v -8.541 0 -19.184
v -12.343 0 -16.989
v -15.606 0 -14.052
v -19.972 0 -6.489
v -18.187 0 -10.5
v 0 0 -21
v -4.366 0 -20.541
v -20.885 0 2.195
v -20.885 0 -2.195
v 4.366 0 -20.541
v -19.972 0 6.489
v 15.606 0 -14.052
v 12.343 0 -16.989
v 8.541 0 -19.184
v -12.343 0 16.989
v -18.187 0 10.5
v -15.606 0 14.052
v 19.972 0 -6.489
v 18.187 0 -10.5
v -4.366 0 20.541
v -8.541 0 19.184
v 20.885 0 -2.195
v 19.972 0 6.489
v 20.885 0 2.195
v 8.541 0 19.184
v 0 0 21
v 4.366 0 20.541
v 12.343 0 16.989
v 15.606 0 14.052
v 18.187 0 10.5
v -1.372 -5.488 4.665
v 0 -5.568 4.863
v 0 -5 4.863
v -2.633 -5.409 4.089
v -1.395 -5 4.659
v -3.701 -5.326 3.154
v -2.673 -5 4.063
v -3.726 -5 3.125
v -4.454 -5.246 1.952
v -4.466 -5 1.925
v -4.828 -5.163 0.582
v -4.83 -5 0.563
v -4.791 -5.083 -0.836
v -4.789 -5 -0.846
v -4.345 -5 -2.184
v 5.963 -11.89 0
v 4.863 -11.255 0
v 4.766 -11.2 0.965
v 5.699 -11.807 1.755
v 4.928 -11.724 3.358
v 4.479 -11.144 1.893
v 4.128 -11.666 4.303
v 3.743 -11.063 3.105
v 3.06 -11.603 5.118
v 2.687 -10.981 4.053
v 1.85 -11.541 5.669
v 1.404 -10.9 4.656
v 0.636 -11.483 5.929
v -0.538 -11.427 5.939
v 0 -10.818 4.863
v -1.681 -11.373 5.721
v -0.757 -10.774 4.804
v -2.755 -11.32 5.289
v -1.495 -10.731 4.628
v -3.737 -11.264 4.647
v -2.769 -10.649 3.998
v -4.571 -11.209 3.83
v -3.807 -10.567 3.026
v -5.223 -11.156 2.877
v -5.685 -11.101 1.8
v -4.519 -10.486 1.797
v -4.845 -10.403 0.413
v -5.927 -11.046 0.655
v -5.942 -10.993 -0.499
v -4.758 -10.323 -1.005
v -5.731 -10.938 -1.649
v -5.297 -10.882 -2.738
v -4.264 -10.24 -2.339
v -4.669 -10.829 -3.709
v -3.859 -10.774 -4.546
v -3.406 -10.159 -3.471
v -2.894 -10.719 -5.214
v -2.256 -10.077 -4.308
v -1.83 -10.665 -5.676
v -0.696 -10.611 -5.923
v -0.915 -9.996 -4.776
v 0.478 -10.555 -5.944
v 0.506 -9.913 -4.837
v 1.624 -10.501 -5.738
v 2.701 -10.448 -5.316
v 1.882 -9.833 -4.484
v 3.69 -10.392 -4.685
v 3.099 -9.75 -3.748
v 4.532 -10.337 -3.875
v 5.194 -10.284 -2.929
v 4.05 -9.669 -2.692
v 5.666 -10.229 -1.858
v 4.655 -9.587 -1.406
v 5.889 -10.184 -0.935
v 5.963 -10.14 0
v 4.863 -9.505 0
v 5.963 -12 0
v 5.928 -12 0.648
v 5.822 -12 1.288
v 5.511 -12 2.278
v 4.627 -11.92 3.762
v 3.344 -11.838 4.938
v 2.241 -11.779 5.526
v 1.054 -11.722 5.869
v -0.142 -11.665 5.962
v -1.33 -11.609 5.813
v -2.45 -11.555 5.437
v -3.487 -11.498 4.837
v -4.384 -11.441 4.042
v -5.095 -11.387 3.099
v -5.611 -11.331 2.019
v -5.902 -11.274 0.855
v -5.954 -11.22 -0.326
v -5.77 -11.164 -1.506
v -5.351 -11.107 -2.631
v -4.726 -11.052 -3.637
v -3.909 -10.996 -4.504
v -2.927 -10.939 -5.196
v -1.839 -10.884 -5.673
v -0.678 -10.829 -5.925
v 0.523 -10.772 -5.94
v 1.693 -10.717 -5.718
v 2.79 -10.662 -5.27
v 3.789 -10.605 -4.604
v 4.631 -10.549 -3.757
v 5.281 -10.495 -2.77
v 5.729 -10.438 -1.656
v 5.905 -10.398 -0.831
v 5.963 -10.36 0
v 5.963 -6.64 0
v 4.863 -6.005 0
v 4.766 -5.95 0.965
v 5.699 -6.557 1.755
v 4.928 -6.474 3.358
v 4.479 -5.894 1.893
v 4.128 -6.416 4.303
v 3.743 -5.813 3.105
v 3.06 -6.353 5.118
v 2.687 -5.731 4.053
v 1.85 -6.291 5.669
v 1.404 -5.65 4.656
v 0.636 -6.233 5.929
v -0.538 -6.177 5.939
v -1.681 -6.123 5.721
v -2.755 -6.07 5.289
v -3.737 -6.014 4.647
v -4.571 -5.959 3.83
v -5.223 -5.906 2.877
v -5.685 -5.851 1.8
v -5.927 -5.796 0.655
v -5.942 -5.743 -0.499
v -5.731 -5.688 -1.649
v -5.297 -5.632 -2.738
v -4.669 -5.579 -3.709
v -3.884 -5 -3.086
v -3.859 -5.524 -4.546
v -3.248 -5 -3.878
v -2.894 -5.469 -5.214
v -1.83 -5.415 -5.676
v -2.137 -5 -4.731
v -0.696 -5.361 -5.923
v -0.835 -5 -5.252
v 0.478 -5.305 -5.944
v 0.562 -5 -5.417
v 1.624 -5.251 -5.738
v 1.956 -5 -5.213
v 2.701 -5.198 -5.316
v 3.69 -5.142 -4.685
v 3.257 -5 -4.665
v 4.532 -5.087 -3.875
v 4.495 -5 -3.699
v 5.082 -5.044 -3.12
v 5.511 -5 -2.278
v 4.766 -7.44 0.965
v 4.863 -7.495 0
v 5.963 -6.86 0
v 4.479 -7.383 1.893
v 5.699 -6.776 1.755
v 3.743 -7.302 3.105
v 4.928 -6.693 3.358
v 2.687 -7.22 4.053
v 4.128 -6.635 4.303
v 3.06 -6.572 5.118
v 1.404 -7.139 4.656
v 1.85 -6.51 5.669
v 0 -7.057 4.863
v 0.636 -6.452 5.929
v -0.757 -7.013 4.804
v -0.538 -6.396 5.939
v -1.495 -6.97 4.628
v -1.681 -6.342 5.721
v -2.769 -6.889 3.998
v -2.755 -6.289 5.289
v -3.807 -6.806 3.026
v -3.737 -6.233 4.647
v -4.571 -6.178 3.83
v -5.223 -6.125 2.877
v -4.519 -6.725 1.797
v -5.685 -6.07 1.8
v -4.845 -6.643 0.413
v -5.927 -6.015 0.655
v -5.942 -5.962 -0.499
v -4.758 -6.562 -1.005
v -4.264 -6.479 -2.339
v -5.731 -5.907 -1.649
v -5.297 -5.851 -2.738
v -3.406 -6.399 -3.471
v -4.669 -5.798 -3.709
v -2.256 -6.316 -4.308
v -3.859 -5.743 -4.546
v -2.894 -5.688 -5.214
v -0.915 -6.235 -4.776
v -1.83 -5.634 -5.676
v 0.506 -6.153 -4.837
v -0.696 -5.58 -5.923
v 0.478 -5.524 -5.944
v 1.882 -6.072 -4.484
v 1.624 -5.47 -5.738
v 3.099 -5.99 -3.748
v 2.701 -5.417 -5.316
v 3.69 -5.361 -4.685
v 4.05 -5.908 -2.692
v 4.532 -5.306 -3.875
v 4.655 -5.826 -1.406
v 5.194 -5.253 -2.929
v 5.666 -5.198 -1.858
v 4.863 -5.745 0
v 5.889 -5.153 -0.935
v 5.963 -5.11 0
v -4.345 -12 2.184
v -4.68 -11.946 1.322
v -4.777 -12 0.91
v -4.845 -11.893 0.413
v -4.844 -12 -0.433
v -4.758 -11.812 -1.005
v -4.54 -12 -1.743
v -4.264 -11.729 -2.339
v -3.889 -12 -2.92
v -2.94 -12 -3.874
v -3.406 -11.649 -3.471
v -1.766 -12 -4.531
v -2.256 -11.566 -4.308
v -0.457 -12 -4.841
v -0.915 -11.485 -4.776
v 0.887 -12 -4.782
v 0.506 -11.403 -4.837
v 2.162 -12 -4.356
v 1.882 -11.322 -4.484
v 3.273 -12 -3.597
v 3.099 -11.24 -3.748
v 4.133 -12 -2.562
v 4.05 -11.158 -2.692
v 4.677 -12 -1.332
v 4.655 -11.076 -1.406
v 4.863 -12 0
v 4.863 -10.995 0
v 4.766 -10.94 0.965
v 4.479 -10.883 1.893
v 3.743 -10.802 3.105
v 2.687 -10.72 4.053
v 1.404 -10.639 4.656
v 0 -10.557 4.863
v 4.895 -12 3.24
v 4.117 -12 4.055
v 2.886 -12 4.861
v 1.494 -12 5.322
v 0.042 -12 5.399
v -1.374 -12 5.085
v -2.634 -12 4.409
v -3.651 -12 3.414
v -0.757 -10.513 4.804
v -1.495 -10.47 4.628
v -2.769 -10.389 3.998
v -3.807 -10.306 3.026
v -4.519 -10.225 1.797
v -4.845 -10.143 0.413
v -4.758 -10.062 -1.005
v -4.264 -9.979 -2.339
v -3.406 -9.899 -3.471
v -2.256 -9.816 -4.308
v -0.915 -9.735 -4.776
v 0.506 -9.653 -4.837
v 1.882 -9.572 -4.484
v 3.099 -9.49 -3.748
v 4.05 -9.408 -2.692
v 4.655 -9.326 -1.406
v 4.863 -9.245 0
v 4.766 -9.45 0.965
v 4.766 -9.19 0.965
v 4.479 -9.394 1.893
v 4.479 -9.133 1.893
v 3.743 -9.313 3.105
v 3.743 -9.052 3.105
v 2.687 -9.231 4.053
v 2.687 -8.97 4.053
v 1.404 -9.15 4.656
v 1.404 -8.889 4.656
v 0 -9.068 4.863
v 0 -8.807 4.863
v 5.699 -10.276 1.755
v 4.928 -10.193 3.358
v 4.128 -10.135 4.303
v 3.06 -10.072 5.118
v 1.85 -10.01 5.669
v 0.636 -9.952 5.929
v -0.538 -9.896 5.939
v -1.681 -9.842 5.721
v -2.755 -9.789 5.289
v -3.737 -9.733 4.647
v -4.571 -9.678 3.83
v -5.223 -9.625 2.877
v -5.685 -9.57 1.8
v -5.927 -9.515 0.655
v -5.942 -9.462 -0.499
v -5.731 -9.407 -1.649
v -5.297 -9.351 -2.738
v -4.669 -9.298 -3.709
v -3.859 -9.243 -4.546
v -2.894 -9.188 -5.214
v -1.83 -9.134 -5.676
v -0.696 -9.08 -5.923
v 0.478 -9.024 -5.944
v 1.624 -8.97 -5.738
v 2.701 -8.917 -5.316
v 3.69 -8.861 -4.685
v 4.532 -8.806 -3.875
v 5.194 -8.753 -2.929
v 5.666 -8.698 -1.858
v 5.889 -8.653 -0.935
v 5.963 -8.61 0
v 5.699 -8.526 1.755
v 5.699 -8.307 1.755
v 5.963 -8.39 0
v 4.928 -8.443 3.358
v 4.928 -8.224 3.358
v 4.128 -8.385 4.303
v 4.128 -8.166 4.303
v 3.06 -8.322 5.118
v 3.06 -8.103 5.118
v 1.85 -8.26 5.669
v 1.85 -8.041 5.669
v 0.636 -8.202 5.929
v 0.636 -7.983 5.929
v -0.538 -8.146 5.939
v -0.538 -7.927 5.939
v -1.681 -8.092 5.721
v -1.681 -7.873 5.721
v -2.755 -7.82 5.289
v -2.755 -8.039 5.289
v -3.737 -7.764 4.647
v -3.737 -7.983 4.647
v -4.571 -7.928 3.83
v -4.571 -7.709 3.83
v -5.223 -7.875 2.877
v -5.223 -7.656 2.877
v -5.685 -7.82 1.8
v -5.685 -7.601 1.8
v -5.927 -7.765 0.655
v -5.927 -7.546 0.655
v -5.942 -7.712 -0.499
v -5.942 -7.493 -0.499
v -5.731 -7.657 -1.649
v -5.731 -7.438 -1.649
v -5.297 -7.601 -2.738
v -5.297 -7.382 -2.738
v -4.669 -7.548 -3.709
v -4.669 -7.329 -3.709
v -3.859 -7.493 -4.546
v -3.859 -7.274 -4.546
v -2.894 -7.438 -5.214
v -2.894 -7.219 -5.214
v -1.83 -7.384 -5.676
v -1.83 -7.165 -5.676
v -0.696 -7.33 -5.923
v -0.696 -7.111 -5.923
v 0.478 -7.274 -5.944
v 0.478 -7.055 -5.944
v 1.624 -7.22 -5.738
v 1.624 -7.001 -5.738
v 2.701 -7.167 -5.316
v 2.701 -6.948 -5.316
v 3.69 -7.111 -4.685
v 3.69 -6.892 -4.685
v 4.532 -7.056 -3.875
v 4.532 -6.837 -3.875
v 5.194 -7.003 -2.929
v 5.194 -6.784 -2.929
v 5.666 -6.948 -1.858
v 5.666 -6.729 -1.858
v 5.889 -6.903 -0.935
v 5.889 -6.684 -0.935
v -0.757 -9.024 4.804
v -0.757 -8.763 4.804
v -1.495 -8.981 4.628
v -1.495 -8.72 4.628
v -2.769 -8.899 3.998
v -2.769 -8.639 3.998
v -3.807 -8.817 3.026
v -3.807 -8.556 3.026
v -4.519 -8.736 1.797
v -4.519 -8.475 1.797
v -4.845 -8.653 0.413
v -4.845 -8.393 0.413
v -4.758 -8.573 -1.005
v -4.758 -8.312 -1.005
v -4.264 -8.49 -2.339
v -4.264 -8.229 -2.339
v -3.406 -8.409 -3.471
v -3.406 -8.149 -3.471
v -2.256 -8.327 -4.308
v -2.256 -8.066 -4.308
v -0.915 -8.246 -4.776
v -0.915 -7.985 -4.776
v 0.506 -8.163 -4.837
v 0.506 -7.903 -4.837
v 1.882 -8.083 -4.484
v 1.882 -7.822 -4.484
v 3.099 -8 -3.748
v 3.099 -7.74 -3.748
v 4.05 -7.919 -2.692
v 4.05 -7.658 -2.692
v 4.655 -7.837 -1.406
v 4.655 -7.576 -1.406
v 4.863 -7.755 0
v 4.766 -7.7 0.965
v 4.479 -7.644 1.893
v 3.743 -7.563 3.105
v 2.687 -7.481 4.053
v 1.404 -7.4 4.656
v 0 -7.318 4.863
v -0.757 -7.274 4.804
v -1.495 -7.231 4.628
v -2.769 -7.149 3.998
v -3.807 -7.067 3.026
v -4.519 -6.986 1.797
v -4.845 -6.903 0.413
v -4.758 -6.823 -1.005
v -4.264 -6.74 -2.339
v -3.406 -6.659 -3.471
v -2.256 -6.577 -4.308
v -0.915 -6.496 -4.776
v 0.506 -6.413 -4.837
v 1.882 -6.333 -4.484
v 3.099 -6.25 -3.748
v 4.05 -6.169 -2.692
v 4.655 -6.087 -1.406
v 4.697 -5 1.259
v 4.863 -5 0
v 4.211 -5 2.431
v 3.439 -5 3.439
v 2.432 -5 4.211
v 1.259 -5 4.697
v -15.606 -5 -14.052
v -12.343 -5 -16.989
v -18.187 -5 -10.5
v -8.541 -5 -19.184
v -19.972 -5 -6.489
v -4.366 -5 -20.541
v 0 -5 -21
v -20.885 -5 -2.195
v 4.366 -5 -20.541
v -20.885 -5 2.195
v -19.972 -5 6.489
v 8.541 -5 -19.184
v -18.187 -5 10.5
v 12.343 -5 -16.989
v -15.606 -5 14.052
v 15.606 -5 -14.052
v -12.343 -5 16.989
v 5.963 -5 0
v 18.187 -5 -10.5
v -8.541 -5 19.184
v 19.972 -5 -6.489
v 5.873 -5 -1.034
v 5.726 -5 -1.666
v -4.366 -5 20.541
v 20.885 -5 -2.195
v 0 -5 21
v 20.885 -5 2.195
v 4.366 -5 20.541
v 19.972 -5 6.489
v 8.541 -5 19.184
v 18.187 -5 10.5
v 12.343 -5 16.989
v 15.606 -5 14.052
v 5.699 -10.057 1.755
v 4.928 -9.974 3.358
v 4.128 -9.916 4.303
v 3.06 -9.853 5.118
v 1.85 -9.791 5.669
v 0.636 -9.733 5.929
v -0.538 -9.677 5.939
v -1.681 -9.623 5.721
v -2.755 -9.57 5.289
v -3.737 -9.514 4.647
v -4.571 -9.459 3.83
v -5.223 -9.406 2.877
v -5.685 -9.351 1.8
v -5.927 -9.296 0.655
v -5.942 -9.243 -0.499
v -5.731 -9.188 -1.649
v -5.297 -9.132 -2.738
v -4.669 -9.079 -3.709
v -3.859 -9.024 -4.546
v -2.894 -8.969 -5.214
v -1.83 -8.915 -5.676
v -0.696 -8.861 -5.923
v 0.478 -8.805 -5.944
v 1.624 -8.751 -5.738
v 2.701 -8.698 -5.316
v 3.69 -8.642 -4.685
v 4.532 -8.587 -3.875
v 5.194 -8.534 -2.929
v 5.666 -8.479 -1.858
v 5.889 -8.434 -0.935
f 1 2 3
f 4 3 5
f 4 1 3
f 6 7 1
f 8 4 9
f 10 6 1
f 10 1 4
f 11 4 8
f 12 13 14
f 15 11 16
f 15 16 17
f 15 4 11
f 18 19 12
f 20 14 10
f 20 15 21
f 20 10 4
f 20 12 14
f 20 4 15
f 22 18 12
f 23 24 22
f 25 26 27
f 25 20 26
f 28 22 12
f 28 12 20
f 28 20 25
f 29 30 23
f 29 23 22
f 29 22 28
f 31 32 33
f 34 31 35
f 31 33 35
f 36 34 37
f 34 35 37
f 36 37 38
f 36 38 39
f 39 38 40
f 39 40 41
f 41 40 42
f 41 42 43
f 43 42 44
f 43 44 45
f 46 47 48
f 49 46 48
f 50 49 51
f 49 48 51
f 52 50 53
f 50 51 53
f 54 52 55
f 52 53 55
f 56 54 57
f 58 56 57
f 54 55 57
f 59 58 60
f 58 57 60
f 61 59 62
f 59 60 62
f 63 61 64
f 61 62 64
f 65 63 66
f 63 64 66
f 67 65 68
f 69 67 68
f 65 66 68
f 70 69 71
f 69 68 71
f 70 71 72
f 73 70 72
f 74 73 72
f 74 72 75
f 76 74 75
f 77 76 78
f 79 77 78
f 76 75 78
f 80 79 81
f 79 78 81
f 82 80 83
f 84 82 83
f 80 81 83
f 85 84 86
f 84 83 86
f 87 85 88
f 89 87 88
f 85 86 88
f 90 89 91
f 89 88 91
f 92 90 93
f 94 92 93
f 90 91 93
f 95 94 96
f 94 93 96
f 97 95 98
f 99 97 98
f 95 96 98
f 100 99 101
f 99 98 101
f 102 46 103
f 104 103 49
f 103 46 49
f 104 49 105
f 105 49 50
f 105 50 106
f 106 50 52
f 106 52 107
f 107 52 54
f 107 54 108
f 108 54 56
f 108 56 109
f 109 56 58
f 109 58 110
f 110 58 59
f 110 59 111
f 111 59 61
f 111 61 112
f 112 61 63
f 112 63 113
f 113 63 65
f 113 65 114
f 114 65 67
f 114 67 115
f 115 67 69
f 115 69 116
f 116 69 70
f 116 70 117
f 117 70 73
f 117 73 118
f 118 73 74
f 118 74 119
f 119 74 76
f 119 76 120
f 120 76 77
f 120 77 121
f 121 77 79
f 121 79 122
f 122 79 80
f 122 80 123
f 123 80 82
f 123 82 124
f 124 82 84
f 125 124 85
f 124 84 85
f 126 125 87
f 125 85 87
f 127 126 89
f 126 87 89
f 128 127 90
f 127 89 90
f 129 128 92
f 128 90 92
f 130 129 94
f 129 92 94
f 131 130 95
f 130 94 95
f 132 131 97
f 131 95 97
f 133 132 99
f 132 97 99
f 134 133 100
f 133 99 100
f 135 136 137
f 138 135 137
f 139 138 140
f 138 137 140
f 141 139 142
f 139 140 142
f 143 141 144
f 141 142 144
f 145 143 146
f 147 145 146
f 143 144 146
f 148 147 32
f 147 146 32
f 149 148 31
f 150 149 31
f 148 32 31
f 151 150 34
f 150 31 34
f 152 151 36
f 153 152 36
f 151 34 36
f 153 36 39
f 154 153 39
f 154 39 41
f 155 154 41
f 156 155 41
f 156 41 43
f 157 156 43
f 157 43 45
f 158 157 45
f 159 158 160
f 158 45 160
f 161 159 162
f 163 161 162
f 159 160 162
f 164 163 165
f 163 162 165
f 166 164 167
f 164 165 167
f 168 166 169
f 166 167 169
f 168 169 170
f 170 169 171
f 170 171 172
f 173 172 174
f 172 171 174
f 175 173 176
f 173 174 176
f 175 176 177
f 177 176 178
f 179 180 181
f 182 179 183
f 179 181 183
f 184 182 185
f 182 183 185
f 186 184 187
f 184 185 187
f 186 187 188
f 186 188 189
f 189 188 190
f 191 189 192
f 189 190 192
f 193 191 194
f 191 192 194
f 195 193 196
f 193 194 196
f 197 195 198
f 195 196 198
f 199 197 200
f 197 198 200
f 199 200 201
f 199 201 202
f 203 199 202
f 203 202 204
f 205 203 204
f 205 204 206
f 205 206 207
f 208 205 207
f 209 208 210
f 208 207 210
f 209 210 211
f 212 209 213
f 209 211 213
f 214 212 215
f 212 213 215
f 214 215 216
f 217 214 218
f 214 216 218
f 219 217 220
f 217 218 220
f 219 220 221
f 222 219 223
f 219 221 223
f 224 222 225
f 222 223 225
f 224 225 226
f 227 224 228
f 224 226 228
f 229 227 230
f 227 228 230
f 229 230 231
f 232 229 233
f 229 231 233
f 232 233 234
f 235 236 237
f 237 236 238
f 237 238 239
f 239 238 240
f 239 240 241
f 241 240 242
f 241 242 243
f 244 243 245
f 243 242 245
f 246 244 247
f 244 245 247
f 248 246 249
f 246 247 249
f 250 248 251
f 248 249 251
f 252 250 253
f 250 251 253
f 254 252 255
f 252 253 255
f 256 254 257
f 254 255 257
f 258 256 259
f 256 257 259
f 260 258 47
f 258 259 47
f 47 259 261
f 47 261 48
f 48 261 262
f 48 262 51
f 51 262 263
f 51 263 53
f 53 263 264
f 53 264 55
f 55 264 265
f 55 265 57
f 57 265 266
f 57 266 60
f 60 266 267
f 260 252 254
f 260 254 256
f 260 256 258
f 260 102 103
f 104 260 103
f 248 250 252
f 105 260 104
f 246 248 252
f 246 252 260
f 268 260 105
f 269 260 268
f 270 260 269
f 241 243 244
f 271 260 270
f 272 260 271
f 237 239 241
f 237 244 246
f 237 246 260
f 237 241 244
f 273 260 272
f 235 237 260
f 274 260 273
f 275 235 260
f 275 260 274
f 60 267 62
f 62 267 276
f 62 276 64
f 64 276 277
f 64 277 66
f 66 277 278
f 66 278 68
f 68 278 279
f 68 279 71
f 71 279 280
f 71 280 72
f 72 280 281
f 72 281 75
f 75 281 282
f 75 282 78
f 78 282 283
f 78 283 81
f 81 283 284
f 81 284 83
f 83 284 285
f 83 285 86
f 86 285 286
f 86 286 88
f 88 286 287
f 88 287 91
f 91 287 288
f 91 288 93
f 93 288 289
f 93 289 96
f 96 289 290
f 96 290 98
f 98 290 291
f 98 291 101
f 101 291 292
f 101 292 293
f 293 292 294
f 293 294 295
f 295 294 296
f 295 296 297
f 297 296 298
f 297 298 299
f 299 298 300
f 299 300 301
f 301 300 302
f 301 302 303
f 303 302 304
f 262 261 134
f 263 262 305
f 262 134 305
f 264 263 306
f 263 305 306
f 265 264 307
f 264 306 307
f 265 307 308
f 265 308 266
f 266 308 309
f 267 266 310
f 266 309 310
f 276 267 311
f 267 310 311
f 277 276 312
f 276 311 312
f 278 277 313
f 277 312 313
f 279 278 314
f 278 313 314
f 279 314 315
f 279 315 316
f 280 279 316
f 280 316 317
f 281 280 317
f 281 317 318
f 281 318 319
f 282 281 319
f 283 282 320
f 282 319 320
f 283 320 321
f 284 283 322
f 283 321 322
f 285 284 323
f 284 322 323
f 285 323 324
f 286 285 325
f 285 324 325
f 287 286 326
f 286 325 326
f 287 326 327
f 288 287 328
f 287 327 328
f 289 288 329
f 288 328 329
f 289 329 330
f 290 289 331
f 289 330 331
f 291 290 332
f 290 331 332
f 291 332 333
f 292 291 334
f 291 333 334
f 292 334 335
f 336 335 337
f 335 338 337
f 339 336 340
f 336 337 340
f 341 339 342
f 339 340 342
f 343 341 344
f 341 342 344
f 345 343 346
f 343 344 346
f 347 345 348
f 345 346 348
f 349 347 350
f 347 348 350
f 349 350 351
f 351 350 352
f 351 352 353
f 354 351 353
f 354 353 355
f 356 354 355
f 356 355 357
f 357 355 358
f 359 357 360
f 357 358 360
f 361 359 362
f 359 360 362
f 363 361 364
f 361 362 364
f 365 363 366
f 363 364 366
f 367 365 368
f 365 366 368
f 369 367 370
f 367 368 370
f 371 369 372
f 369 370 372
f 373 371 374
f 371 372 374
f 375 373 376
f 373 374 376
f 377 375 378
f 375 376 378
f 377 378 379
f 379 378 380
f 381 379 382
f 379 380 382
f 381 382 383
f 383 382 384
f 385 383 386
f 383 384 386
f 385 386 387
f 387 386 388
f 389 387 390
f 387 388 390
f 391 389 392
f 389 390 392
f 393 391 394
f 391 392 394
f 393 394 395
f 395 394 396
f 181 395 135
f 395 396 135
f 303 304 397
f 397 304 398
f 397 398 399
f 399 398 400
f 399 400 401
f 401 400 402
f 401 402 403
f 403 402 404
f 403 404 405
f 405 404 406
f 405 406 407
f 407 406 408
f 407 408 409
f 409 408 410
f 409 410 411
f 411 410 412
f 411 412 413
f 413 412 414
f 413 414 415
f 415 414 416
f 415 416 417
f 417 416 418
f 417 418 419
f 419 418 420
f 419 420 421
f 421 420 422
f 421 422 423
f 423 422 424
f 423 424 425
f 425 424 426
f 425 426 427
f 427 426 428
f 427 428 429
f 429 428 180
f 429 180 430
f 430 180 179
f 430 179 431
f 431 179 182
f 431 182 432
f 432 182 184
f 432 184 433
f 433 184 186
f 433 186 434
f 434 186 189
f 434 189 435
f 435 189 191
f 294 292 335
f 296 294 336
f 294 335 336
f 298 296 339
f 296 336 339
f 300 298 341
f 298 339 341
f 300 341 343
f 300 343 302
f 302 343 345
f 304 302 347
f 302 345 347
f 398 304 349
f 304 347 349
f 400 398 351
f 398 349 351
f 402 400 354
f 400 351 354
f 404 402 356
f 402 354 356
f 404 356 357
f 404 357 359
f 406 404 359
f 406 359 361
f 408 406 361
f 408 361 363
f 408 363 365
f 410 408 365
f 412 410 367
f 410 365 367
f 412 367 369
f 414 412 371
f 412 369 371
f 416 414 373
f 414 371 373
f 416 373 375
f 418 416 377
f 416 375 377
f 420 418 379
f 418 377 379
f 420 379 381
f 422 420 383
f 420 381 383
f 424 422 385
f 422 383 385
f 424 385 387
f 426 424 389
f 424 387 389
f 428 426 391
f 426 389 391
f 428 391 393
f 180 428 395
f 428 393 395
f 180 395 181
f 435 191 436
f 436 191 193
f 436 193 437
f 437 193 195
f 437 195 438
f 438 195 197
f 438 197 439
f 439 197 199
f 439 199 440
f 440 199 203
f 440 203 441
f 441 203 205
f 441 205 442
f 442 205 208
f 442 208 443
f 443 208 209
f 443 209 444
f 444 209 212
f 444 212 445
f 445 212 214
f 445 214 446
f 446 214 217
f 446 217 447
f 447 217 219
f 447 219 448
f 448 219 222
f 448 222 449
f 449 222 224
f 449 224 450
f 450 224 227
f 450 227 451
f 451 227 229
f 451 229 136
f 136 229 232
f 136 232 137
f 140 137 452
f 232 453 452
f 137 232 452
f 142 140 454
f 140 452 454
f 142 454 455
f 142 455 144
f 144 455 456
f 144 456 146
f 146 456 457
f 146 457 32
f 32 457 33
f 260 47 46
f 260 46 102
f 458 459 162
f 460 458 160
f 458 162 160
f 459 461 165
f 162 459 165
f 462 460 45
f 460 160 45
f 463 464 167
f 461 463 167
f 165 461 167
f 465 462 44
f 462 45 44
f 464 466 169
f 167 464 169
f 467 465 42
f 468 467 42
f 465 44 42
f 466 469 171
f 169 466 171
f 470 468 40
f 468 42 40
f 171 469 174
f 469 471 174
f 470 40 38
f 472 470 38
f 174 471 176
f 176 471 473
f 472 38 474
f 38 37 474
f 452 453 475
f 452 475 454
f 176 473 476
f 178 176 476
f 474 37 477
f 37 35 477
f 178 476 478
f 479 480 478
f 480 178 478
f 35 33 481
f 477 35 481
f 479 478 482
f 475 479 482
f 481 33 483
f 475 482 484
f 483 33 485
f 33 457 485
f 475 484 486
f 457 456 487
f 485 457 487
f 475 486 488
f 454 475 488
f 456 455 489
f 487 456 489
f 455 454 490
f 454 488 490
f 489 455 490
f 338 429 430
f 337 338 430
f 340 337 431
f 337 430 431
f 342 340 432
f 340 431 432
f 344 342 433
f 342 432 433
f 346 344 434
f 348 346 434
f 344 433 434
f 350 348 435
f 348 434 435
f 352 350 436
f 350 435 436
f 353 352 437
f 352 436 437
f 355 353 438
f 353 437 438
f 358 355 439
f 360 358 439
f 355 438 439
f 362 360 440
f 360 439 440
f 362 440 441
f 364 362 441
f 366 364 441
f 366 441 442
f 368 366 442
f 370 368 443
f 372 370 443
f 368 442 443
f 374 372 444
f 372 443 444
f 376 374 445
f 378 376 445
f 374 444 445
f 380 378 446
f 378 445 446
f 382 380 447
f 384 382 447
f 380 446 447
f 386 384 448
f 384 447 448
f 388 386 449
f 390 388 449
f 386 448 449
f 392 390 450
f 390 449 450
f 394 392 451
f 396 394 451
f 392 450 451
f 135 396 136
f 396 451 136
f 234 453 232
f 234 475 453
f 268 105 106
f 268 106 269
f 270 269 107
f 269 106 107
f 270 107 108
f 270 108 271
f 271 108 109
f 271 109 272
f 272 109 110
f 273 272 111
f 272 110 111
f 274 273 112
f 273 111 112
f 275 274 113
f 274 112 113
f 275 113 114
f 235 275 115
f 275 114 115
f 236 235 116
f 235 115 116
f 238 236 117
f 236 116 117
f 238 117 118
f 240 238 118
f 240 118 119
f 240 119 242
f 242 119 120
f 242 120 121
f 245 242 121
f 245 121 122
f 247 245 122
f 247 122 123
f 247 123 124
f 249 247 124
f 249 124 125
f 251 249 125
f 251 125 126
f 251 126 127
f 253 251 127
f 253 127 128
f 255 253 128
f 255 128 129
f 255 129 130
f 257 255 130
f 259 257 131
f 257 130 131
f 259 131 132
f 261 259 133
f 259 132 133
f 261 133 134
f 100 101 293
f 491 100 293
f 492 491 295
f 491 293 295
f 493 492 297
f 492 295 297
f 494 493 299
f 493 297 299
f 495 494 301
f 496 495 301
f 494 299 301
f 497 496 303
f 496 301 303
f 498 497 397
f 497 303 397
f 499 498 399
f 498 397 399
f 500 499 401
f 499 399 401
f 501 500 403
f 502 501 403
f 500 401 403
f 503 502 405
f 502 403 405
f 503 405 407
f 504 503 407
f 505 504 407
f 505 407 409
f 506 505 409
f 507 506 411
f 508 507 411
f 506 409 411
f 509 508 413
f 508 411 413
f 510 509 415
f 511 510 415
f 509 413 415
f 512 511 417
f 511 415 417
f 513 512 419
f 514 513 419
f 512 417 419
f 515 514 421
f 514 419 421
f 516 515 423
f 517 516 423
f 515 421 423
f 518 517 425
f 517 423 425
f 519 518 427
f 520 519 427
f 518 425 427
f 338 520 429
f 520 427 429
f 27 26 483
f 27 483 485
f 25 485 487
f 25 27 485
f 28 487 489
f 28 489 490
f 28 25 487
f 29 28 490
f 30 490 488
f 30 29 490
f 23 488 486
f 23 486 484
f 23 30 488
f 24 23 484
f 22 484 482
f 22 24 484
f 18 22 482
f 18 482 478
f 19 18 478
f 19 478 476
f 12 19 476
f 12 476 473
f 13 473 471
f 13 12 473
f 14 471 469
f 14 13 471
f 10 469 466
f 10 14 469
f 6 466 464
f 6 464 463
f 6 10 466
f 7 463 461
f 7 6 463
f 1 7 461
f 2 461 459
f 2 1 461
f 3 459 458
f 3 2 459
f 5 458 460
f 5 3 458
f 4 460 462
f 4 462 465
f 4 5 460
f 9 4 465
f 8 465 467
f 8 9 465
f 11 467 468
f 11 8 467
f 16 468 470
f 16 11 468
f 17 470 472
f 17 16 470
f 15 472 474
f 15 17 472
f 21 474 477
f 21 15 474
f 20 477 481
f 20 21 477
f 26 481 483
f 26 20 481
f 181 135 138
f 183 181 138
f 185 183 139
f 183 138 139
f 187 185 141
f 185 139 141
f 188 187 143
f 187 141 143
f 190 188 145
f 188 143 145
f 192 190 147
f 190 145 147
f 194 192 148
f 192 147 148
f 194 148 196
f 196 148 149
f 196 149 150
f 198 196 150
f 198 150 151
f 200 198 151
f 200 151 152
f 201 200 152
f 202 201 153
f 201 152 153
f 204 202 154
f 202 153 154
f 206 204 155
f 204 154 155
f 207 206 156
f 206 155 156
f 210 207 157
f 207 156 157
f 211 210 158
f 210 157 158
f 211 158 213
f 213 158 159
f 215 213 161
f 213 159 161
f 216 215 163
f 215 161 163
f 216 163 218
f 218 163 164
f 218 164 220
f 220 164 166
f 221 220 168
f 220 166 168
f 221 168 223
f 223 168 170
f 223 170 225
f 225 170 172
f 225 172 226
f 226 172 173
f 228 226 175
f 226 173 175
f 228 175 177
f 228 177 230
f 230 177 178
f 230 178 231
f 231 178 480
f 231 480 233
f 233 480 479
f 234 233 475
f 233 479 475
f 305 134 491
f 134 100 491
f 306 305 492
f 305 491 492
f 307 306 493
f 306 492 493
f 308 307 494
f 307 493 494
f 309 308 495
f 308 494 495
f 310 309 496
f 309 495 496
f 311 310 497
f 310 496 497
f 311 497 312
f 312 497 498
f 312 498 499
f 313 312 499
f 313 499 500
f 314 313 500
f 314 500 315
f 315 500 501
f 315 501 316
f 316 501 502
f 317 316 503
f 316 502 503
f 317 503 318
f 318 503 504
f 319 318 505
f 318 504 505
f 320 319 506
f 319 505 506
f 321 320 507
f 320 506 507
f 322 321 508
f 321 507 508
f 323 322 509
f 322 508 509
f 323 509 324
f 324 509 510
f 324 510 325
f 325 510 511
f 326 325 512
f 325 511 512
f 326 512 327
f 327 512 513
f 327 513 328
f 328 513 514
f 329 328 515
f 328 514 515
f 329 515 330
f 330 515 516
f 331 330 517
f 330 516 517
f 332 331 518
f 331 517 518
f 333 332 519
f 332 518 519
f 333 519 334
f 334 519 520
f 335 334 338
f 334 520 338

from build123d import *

# Parameters (mm, degrees)
SKETCH1_R               = 21
BOSS_EXTRUDE1_DEPTH     = 5
SKETCH2_R               = 4.863
BOSS_EXTRUDE2_DEPTH     = 7
SWEEP1_PITCH            = 1.75
SWEEP1_HEIGHT           = 7
SWEEP1_RADIUS           = 6
SWEEP1_START_ANGLE      = 90
CUT_EXTRUDE1_DEPTH      = 33.325986765
CUT_EXTRUDE1_DEPTH_BACK = 33.325986765


with BuildPart() as part:
    # Sketch1 → Boss-Extrude1 (new body)
    with BuildSketch(Plane(origin=(0, 0, 0), x_dir=(1, 0, 0), z_dir=(0, 1, 0))):
        Circle(SKETCH1_R)
    extrude(amount=-BOSS_EXTRUDE1_DEPTH)

    # Sketch2 → Boss-Extrude2 (add)
    with BuildSketch(Plane.XZ.offset(5)):
        Circle(SKETCH2_R)
    extrude(amount=BOSS_EXTRUDE2_DEPTH)

    # Sweep1: sweep along a helix
    with BuildLine() as sweep1_path:
        add(Helix(SWEEP1_PITCH, SWEEP1_HEIGHT, SWEEP1_RADIUS, center=(0, -12, 0), direction=(0, 1, 0), lefthand=True, mode=Mode.PRIVATE).rotate(Axis((0, -12, 0), (0, 1, 0)), SWEEP1_START_ANGLE))
    # Sketch11 → Sweep1 (sweep)
    with BuildSketch(Plane.XY):
        Polygon((4.826232454, -5), (4.826232454, -5.765947256), (5.963232454, -5.1095), (5.963232454, -4.8905), (4.826232454, -4.234052744), align=None)
    sweep(path=sweep1_path.line, is_frenet=True)

    # Sketch12 → Cut-Extrude1 (cut, two sides: drawn at the far end of the back side and taken through both)
    with BuildSketch(Plane.XY.offset(-CUT_EXTRUDE1_DEPTH_BACK)):
        Polygon((0, -12), (5.963232454, -12), (5.963232454, -12.765947256), (0, -12.765947256), (-4.863, -12.765947256), (-4.863, -12), align=None)
    extrude(amount=CUT_EXTRUDE1_DEPTH + CUT_EXTRUDE1_DEPTH_BACK, mode=Mode.SUBTRACT)


solid = part.part
